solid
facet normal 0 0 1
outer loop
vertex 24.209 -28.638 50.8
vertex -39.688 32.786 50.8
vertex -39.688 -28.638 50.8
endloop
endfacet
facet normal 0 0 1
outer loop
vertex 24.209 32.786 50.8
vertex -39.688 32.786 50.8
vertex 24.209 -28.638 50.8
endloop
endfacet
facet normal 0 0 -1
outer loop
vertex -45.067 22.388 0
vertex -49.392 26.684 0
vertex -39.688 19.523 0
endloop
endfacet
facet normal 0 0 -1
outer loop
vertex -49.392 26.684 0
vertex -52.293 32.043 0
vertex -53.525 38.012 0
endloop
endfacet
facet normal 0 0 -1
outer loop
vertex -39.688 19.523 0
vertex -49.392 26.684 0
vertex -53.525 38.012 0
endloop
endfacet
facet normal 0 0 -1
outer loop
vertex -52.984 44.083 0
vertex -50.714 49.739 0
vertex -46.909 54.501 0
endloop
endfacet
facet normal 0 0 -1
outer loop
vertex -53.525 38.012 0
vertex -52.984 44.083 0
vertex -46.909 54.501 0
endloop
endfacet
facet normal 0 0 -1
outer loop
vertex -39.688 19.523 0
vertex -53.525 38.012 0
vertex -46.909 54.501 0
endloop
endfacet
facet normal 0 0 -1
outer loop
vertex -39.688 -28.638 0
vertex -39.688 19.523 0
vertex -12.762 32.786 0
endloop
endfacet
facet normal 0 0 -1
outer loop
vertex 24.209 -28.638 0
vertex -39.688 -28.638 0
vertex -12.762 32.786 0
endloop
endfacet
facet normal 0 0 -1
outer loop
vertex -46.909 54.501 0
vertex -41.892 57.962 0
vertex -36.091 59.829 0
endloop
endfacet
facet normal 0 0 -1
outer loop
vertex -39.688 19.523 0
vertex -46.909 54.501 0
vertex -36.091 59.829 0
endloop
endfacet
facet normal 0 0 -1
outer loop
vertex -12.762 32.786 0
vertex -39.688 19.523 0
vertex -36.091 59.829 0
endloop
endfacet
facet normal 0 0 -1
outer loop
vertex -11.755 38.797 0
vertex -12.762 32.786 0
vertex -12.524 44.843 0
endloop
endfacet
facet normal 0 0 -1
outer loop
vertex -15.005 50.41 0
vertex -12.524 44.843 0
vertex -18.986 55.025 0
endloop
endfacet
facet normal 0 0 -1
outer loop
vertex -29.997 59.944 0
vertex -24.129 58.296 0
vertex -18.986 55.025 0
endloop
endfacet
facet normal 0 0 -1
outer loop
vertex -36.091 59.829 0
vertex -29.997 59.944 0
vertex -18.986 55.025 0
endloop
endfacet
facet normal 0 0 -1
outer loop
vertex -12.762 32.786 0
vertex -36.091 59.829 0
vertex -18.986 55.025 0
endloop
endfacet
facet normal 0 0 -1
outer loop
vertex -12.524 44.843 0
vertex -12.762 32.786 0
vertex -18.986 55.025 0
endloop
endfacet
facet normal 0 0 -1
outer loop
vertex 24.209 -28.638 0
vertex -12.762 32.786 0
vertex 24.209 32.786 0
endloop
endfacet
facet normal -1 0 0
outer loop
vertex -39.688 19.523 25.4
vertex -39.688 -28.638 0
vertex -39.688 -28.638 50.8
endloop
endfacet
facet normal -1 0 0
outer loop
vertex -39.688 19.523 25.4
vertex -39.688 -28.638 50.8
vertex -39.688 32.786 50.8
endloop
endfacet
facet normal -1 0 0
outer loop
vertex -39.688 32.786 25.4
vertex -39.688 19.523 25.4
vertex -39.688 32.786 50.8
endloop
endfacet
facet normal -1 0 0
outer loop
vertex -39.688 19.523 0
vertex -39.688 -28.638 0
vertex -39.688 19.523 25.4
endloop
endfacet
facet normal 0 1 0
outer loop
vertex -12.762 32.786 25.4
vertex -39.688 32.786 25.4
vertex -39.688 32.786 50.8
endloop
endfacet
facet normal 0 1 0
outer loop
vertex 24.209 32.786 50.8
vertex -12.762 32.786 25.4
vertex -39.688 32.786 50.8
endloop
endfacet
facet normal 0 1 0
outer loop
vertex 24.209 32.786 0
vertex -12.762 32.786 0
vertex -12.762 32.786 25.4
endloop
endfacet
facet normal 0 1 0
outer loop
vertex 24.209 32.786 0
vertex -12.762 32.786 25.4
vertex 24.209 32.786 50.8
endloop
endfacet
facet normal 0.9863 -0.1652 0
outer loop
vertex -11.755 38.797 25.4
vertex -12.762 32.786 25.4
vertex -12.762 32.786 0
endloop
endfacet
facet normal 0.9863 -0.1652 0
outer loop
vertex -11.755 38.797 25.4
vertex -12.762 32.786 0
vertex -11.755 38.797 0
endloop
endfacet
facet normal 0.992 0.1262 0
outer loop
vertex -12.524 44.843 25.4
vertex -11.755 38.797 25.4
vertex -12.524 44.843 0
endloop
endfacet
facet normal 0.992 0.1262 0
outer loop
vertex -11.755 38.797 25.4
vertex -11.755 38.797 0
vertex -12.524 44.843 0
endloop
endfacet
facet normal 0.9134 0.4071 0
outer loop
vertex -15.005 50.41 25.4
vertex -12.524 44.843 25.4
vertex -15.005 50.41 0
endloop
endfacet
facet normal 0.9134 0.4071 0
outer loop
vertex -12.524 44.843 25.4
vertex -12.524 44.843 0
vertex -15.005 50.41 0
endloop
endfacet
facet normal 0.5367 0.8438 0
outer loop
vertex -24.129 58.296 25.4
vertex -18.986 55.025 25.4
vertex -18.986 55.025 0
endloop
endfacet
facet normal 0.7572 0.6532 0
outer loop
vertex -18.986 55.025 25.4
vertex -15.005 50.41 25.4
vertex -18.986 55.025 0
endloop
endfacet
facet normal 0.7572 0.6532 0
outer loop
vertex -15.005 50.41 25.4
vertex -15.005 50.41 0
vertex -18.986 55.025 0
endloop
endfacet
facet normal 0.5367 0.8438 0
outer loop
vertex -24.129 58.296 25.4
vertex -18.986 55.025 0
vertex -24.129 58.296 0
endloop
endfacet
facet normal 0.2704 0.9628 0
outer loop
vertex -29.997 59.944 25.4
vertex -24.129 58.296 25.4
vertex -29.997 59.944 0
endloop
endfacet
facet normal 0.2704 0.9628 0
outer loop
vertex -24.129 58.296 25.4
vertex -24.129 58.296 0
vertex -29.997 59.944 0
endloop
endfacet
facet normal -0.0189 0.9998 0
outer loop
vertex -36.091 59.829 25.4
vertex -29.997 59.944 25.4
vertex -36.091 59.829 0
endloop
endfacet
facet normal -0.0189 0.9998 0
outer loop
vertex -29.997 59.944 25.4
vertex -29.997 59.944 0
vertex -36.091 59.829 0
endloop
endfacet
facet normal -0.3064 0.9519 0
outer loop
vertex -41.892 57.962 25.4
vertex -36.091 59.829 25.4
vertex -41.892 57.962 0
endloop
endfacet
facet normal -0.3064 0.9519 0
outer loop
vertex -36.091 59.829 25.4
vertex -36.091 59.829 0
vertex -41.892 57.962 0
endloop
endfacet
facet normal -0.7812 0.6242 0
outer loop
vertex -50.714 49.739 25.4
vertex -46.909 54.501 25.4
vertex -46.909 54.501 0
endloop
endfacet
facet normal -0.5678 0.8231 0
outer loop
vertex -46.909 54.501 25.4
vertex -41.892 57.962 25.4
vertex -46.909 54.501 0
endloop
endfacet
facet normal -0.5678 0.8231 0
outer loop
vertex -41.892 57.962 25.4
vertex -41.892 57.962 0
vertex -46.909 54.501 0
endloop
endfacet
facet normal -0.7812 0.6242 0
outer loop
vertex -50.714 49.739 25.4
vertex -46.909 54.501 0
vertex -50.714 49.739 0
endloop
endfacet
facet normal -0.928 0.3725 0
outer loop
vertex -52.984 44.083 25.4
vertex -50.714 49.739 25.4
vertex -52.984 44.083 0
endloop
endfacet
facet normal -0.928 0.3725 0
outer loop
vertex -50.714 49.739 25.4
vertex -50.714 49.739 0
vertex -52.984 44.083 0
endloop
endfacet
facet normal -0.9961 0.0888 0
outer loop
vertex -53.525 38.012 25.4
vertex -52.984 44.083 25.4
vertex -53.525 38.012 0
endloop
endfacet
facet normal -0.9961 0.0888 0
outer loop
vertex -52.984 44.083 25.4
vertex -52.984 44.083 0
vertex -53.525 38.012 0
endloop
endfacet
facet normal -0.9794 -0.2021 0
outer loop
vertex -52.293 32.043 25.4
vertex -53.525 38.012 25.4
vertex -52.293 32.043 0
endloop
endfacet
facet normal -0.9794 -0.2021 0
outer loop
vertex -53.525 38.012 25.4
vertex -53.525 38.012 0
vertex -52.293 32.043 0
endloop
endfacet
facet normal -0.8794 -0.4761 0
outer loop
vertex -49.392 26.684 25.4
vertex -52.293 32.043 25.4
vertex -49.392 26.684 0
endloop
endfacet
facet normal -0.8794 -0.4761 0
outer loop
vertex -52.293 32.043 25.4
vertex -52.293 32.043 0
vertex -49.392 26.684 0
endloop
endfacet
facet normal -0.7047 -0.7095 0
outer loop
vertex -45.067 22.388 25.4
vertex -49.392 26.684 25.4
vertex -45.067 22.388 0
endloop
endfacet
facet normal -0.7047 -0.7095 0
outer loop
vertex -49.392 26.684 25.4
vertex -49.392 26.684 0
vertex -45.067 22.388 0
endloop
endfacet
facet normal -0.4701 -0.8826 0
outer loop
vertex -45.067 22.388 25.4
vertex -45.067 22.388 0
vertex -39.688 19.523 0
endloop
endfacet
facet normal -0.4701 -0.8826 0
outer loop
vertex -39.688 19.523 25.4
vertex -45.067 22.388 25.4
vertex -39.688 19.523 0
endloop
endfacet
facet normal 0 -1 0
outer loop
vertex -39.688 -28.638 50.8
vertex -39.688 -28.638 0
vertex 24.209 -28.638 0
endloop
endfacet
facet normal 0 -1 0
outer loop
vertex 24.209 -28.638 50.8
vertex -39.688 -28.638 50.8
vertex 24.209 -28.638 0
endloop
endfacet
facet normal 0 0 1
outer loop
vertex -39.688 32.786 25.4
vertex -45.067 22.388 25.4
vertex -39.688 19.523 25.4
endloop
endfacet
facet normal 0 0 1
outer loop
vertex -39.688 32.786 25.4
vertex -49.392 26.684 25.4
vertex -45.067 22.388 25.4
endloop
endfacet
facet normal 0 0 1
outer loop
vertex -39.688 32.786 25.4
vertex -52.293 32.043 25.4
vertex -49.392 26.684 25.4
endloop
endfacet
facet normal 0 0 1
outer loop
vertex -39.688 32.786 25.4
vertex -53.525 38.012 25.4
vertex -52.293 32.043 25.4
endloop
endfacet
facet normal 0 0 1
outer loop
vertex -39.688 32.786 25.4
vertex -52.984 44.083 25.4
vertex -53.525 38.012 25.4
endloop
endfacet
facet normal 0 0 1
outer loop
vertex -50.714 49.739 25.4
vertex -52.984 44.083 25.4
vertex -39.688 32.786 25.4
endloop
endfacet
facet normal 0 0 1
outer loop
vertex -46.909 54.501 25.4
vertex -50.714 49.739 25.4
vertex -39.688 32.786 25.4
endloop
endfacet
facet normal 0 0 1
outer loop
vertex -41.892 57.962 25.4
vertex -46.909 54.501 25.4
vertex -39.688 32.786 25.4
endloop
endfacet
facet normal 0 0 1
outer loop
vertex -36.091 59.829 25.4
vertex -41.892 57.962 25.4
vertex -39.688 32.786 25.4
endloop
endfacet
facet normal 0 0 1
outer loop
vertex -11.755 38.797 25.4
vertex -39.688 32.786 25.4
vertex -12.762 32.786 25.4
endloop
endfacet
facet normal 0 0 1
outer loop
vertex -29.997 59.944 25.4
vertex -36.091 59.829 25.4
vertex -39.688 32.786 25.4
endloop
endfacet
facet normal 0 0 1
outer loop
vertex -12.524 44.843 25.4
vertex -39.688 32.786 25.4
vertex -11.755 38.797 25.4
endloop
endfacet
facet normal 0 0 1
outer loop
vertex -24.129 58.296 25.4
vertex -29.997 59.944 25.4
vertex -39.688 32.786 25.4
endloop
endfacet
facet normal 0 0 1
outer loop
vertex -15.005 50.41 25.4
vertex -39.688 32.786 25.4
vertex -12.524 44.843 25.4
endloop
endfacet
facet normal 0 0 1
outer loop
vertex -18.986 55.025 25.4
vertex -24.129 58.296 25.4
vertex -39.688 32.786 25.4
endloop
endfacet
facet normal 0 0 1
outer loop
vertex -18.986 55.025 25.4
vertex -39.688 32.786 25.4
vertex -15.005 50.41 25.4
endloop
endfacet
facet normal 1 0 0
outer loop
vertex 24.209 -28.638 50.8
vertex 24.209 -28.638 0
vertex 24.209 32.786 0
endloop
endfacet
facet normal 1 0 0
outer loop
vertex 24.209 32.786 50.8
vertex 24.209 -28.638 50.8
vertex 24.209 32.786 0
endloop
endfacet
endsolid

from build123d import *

# Parameters (mm, degrees)
F0_W      = 63.8971067965
F0_H      = 61.4244844764
F1_DEPTH  = 25.4
F2_R      = 20.9044969904
F1_FACE_W = 63.8971067965
F1_FACE_H = 61.4244844764
F3_DEPTH  = 25.4


# Not quite as in the source:
# - a feature of the source that left no trace in its solid (it failed there, or was rolled back) is left out


with BuildPart() as f1:
    # F0 (on Top) → F1 (new body)
    with BuildSketch(Plane.XY):
        with Locations((-7.7395718545, 2.0738141611)):
            Rectangle(F0_W, F0_H)
    extrude(amount=F1_DEPTH)

    # F2 (on Top) + F1_face (on face) → F3 (join)
    with BuildSketch(Plane.XY):
        with Locations((-32.6551906765, 39.2090491951)):
            Circle(F2_R)
    with BuildSketch(Plane(origin=(-7.7395718545, 2.0738141611, 25.4), x_dir=(1, 0, 0), z_dir=(0, 0, 1))):
        Rectangle(F1_FACE_W, F1_FACE_H)
    extrude(amount=F3_DEPTH)


solid = f1.part
